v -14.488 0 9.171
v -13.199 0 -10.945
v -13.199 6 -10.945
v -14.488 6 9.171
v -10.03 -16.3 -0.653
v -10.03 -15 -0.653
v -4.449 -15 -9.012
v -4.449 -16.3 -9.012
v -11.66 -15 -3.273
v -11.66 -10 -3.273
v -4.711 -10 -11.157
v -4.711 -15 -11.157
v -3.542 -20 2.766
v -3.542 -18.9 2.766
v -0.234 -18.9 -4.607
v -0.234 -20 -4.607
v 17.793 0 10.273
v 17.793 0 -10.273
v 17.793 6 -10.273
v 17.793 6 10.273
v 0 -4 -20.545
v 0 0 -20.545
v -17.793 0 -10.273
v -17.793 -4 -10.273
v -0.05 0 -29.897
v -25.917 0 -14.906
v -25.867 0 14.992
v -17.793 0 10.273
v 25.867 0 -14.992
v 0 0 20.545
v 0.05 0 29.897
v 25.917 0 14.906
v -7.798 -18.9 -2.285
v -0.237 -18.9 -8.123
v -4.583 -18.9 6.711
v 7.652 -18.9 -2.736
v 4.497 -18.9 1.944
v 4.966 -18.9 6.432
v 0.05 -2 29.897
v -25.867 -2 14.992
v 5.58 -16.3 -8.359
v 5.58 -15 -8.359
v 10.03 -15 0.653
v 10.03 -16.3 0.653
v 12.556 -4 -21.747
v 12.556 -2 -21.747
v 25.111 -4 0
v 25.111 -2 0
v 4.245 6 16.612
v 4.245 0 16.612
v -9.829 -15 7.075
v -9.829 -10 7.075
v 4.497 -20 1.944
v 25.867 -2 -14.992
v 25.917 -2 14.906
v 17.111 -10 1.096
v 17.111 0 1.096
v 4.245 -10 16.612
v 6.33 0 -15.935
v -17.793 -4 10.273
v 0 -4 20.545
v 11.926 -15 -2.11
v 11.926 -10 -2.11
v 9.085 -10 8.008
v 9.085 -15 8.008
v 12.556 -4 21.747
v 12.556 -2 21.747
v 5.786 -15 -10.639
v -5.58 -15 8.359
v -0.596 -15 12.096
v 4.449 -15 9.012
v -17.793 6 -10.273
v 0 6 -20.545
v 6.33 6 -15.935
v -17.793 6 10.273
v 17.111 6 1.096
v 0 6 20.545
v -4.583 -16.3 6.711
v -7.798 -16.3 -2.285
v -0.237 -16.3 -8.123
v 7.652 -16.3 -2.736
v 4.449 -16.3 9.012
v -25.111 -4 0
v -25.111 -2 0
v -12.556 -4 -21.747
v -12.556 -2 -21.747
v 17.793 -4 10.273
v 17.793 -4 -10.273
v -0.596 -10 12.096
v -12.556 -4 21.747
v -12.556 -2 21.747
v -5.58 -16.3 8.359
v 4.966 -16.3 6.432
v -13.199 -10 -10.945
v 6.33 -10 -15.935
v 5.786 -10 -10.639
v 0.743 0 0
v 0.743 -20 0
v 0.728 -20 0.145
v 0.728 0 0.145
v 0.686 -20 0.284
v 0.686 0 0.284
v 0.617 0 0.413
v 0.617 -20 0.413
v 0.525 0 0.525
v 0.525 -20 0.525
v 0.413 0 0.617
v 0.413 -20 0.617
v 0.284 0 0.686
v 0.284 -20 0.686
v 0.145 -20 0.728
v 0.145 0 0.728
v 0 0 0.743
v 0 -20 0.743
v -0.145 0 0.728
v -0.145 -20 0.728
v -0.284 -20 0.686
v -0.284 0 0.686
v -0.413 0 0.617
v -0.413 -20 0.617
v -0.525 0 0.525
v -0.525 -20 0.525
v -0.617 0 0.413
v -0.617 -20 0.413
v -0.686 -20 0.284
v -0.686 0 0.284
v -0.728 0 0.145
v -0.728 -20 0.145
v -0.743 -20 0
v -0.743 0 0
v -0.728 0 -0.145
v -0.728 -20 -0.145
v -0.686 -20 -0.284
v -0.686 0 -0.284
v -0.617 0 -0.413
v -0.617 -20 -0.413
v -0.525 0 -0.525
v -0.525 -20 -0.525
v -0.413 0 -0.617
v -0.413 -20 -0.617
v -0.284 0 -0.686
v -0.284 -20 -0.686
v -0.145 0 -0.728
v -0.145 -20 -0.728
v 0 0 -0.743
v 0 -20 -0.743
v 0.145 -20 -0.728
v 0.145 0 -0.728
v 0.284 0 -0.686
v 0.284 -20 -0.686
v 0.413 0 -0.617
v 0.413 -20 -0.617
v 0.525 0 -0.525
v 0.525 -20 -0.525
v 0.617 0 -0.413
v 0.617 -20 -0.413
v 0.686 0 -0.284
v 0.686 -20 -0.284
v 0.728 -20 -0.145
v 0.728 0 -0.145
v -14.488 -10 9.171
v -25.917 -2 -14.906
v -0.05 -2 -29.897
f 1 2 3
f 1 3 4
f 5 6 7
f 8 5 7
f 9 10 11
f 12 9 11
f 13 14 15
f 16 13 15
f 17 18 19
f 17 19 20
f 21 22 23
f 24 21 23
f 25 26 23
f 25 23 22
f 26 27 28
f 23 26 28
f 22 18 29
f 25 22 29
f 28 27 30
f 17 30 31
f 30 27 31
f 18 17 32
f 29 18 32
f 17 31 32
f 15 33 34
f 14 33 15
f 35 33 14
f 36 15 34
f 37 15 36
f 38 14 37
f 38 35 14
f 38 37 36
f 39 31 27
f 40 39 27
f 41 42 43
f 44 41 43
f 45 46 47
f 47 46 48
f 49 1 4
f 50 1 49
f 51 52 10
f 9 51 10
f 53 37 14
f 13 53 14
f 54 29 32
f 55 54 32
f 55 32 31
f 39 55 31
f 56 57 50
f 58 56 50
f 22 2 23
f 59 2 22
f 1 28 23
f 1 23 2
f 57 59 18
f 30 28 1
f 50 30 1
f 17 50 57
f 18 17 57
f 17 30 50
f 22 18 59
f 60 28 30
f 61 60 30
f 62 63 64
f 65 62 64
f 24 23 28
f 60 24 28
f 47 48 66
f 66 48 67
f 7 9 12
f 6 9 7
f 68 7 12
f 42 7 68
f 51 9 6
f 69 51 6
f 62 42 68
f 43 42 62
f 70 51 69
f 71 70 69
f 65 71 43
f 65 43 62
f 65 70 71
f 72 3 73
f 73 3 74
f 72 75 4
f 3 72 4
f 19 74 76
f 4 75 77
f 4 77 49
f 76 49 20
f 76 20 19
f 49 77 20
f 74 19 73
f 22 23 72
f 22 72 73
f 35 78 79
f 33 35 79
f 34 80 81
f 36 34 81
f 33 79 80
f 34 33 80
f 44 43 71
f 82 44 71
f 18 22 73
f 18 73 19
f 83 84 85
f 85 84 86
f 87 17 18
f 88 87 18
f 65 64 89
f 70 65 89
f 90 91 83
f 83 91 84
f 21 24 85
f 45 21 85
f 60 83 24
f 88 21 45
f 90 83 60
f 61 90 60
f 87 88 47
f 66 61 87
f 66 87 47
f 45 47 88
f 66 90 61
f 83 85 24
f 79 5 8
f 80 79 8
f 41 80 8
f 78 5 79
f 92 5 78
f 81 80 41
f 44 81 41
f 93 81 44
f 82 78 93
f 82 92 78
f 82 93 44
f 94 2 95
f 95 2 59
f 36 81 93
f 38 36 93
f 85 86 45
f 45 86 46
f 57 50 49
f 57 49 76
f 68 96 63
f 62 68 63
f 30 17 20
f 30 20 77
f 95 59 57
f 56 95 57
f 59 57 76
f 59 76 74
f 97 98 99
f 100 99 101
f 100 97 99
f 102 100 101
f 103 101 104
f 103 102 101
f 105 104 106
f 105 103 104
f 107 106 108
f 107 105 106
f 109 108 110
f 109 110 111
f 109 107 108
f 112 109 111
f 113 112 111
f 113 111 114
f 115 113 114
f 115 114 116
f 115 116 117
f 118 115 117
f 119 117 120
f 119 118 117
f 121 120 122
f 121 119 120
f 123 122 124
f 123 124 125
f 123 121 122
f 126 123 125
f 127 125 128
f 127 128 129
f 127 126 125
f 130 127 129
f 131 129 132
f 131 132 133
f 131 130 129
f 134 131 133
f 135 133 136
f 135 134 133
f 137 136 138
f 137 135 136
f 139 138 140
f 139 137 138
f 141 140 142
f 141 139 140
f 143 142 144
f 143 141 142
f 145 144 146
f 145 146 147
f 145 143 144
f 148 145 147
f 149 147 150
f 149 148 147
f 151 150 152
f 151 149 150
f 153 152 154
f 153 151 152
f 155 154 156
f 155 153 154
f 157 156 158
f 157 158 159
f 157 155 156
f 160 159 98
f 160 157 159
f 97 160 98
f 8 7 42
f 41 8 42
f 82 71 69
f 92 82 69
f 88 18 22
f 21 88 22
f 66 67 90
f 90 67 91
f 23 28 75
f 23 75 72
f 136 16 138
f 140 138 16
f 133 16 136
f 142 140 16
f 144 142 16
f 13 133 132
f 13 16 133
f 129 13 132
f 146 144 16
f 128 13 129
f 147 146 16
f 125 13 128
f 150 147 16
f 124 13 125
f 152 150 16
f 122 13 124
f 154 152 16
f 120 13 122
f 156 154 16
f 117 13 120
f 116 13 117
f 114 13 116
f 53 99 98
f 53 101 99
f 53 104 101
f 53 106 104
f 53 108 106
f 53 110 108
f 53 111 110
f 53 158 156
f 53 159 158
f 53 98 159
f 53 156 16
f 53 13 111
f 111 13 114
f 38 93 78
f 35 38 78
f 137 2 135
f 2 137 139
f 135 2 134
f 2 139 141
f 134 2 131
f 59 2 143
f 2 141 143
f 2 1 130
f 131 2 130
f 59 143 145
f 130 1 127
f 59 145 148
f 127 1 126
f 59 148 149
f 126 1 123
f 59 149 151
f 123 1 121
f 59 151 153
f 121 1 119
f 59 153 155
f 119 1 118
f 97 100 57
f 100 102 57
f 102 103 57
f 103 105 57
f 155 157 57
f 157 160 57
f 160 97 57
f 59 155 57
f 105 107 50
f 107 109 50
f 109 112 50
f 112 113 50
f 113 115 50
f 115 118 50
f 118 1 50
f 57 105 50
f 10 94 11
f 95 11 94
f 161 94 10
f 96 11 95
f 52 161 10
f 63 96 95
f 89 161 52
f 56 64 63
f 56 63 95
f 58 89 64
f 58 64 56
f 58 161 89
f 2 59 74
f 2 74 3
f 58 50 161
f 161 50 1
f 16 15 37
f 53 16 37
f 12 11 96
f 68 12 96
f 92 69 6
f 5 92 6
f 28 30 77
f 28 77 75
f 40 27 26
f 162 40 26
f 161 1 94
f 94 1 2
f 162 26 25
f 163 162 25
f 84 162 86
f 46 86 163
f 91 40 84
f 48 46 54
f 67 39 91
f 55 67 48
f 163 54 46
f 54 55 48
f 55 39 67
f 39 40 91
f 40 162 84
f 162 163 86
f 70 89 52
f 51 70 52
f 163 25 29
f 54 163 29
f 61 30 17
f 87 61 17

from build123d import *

# Parameters (mm, degrees)
F1_DEPTH = 4
F2_DEPTH = 2
F3_DEPTH = 6
F4_DEPTH = 10
F5_DEPTH = 15
F6_DEPTH = 16.3
F7_DEPTH = 18.9
F0_R     = 0.742587
F8_DEPTH = 20


with BuildPart() as f1:
    # F0 (on Front) → F1 (new body)
    with BuildSketch(Plane.XZ):
        Polygon((-12.555582, -21.746906), (12.555582, -21.746906), (25.111164, 0), (12.555582, 21.746906), (-12.555582, 21.746906), (-25.111164, 0), align=None)
        Polygon((0, 20.545496), (17.792922, 10.272748), (17.792922, -10.272748), (0, -20.545496), (-17.792922, -10.272748), (-17.792922, 10.272748), align=None, mode=Mode.SUBTRACT)
    extrude(amount=F1_DEPTH)

    # F0 (on Front) → F2 (join)
    with BuildSketch(Plane.XZ):
        Polygon((-0.049846, -29.897445), (25.867024, -14.99189), (25.916869, 14.905555), (0.049846, 29.897445), (-25.867024, 14.99189), (-25.916869, -14.905555), align=None)
        Polygon((25.111164, 0), (12.555582, -21.746906), (-12.555582, -21.746906), (-25.111164, 0), (-12.555582, 21.746906), (12.555582, 21.746906), align=None, mode=Mode.SUBTRACT)
    extrude(amount=F2_DEPTH)

    # F0 (on Front) → F3 (join)
    with BuildSketch(Plane.XZ):
        Polygon((17.792922, -10.272748), (17.792922, 10.272748), (0, 20.545496), (-17.792922, 10.272748), (-17.792922, -10.272748), (0, -20.545496), align=None)
        Polygon((4.244969, 16.612462), (17.111157, 1.096328), (6.330308, -15.934894), (-13.198812, -10.944634), (-14.487622, 9.170738), align=None, mode=Mode.SUBTRACT)
    extrude(amount=-F3_DEPTH)


with BuildPart() as f4:
    # F0 (on Front) → F4 (new body)
    with BuildSketch(Plane.XZ):
        Polygon((6.330308, -15.934894), (17.111157, 1.096328), (4.244969, 16.612462), (-14.487622, 9.170738), (-13.198812, -10.944634), align=None)
        Polygon((9.08521, 8.008093), (11.925515, -2.110139), (5.785664, -10.639393), (-4.71091, -11.156968), (-11.660073, -3.273118), (-9.828963, 7.075457), (-0.596443, 12.096068), align=None, mode=Mode.SUBTRACT)
    extrude(amount=F4_DEPTH)

    # F0 (on Front) → F5 (join)
    with BuildSketch(Plane.XZ):
        Polygon((5.785664, -10.639393), (11.925515, -2.110139), (9.08521, 8.008093), (-0.596443, 12.096068), (-9.828963, 7.075457), (-11.660073, -3.273118), (-4.71091, -11.156968), align=None)
        Polygon((4.449288, 9.012364), (10.02958, 0.652985), (5.580292, -8.359378), (-4.449288, -9.012364), (-10.02958, -0.652985), (-5.580292, 8.359378), align=None, mode=Mode.SUBTRACT)
    extrude(amount=F5_DEPTH)

    # F0 (on Front) → F6 (join)
    with BuildSketch(Plane.XZ):
        Polygon((5.580292, -8.359378), (10.02958, 0.652985), (4.449288, 9.012364), (-5.580292, 8.359378), (-10.02958, -0.652985), (-4.449288, -9.012364), align=None)
        Polygon((4.966286, 6.432054), (7.651914, -2.735604), (-0.237143, -8.122751), (-7.798476, -2.284532), (-4.58258, 6.710833), align=None, mode=Mode.SUBTRACT)
    extrude(amount=F6_DEPTH)

    # F0 (on Front) → F7 (join)
    with BuildSketch(Plane.XZ):
        Polygon((-0.237143, -8.122751), (7.651914, -2.735604), (4.966286, 6.432054), (-4.58258, 6.710833), (-7.798476, -2.284532), align=None)
        Polygon((-3.542126, 2.765923), (4.497126, 1.943987), (-0.234318, -4.607241), align=None, mode=Mode.SUBTRACT)
    extrude(amount=F7_DEPTH)

    # F0 (on Front) → F8 (join)
    with BuildSketch(Plane.XZ):
        Polygon((-0.234318, -4.607241), (4.497126, 1.943987), (-3.542126, 2.765923), align=None)
        Circle(F0_R, mode=Mode.SUBTRACT)
    extrude(amount=F8_DEPTH)


solid = Compound([f1.part, f4.part])
